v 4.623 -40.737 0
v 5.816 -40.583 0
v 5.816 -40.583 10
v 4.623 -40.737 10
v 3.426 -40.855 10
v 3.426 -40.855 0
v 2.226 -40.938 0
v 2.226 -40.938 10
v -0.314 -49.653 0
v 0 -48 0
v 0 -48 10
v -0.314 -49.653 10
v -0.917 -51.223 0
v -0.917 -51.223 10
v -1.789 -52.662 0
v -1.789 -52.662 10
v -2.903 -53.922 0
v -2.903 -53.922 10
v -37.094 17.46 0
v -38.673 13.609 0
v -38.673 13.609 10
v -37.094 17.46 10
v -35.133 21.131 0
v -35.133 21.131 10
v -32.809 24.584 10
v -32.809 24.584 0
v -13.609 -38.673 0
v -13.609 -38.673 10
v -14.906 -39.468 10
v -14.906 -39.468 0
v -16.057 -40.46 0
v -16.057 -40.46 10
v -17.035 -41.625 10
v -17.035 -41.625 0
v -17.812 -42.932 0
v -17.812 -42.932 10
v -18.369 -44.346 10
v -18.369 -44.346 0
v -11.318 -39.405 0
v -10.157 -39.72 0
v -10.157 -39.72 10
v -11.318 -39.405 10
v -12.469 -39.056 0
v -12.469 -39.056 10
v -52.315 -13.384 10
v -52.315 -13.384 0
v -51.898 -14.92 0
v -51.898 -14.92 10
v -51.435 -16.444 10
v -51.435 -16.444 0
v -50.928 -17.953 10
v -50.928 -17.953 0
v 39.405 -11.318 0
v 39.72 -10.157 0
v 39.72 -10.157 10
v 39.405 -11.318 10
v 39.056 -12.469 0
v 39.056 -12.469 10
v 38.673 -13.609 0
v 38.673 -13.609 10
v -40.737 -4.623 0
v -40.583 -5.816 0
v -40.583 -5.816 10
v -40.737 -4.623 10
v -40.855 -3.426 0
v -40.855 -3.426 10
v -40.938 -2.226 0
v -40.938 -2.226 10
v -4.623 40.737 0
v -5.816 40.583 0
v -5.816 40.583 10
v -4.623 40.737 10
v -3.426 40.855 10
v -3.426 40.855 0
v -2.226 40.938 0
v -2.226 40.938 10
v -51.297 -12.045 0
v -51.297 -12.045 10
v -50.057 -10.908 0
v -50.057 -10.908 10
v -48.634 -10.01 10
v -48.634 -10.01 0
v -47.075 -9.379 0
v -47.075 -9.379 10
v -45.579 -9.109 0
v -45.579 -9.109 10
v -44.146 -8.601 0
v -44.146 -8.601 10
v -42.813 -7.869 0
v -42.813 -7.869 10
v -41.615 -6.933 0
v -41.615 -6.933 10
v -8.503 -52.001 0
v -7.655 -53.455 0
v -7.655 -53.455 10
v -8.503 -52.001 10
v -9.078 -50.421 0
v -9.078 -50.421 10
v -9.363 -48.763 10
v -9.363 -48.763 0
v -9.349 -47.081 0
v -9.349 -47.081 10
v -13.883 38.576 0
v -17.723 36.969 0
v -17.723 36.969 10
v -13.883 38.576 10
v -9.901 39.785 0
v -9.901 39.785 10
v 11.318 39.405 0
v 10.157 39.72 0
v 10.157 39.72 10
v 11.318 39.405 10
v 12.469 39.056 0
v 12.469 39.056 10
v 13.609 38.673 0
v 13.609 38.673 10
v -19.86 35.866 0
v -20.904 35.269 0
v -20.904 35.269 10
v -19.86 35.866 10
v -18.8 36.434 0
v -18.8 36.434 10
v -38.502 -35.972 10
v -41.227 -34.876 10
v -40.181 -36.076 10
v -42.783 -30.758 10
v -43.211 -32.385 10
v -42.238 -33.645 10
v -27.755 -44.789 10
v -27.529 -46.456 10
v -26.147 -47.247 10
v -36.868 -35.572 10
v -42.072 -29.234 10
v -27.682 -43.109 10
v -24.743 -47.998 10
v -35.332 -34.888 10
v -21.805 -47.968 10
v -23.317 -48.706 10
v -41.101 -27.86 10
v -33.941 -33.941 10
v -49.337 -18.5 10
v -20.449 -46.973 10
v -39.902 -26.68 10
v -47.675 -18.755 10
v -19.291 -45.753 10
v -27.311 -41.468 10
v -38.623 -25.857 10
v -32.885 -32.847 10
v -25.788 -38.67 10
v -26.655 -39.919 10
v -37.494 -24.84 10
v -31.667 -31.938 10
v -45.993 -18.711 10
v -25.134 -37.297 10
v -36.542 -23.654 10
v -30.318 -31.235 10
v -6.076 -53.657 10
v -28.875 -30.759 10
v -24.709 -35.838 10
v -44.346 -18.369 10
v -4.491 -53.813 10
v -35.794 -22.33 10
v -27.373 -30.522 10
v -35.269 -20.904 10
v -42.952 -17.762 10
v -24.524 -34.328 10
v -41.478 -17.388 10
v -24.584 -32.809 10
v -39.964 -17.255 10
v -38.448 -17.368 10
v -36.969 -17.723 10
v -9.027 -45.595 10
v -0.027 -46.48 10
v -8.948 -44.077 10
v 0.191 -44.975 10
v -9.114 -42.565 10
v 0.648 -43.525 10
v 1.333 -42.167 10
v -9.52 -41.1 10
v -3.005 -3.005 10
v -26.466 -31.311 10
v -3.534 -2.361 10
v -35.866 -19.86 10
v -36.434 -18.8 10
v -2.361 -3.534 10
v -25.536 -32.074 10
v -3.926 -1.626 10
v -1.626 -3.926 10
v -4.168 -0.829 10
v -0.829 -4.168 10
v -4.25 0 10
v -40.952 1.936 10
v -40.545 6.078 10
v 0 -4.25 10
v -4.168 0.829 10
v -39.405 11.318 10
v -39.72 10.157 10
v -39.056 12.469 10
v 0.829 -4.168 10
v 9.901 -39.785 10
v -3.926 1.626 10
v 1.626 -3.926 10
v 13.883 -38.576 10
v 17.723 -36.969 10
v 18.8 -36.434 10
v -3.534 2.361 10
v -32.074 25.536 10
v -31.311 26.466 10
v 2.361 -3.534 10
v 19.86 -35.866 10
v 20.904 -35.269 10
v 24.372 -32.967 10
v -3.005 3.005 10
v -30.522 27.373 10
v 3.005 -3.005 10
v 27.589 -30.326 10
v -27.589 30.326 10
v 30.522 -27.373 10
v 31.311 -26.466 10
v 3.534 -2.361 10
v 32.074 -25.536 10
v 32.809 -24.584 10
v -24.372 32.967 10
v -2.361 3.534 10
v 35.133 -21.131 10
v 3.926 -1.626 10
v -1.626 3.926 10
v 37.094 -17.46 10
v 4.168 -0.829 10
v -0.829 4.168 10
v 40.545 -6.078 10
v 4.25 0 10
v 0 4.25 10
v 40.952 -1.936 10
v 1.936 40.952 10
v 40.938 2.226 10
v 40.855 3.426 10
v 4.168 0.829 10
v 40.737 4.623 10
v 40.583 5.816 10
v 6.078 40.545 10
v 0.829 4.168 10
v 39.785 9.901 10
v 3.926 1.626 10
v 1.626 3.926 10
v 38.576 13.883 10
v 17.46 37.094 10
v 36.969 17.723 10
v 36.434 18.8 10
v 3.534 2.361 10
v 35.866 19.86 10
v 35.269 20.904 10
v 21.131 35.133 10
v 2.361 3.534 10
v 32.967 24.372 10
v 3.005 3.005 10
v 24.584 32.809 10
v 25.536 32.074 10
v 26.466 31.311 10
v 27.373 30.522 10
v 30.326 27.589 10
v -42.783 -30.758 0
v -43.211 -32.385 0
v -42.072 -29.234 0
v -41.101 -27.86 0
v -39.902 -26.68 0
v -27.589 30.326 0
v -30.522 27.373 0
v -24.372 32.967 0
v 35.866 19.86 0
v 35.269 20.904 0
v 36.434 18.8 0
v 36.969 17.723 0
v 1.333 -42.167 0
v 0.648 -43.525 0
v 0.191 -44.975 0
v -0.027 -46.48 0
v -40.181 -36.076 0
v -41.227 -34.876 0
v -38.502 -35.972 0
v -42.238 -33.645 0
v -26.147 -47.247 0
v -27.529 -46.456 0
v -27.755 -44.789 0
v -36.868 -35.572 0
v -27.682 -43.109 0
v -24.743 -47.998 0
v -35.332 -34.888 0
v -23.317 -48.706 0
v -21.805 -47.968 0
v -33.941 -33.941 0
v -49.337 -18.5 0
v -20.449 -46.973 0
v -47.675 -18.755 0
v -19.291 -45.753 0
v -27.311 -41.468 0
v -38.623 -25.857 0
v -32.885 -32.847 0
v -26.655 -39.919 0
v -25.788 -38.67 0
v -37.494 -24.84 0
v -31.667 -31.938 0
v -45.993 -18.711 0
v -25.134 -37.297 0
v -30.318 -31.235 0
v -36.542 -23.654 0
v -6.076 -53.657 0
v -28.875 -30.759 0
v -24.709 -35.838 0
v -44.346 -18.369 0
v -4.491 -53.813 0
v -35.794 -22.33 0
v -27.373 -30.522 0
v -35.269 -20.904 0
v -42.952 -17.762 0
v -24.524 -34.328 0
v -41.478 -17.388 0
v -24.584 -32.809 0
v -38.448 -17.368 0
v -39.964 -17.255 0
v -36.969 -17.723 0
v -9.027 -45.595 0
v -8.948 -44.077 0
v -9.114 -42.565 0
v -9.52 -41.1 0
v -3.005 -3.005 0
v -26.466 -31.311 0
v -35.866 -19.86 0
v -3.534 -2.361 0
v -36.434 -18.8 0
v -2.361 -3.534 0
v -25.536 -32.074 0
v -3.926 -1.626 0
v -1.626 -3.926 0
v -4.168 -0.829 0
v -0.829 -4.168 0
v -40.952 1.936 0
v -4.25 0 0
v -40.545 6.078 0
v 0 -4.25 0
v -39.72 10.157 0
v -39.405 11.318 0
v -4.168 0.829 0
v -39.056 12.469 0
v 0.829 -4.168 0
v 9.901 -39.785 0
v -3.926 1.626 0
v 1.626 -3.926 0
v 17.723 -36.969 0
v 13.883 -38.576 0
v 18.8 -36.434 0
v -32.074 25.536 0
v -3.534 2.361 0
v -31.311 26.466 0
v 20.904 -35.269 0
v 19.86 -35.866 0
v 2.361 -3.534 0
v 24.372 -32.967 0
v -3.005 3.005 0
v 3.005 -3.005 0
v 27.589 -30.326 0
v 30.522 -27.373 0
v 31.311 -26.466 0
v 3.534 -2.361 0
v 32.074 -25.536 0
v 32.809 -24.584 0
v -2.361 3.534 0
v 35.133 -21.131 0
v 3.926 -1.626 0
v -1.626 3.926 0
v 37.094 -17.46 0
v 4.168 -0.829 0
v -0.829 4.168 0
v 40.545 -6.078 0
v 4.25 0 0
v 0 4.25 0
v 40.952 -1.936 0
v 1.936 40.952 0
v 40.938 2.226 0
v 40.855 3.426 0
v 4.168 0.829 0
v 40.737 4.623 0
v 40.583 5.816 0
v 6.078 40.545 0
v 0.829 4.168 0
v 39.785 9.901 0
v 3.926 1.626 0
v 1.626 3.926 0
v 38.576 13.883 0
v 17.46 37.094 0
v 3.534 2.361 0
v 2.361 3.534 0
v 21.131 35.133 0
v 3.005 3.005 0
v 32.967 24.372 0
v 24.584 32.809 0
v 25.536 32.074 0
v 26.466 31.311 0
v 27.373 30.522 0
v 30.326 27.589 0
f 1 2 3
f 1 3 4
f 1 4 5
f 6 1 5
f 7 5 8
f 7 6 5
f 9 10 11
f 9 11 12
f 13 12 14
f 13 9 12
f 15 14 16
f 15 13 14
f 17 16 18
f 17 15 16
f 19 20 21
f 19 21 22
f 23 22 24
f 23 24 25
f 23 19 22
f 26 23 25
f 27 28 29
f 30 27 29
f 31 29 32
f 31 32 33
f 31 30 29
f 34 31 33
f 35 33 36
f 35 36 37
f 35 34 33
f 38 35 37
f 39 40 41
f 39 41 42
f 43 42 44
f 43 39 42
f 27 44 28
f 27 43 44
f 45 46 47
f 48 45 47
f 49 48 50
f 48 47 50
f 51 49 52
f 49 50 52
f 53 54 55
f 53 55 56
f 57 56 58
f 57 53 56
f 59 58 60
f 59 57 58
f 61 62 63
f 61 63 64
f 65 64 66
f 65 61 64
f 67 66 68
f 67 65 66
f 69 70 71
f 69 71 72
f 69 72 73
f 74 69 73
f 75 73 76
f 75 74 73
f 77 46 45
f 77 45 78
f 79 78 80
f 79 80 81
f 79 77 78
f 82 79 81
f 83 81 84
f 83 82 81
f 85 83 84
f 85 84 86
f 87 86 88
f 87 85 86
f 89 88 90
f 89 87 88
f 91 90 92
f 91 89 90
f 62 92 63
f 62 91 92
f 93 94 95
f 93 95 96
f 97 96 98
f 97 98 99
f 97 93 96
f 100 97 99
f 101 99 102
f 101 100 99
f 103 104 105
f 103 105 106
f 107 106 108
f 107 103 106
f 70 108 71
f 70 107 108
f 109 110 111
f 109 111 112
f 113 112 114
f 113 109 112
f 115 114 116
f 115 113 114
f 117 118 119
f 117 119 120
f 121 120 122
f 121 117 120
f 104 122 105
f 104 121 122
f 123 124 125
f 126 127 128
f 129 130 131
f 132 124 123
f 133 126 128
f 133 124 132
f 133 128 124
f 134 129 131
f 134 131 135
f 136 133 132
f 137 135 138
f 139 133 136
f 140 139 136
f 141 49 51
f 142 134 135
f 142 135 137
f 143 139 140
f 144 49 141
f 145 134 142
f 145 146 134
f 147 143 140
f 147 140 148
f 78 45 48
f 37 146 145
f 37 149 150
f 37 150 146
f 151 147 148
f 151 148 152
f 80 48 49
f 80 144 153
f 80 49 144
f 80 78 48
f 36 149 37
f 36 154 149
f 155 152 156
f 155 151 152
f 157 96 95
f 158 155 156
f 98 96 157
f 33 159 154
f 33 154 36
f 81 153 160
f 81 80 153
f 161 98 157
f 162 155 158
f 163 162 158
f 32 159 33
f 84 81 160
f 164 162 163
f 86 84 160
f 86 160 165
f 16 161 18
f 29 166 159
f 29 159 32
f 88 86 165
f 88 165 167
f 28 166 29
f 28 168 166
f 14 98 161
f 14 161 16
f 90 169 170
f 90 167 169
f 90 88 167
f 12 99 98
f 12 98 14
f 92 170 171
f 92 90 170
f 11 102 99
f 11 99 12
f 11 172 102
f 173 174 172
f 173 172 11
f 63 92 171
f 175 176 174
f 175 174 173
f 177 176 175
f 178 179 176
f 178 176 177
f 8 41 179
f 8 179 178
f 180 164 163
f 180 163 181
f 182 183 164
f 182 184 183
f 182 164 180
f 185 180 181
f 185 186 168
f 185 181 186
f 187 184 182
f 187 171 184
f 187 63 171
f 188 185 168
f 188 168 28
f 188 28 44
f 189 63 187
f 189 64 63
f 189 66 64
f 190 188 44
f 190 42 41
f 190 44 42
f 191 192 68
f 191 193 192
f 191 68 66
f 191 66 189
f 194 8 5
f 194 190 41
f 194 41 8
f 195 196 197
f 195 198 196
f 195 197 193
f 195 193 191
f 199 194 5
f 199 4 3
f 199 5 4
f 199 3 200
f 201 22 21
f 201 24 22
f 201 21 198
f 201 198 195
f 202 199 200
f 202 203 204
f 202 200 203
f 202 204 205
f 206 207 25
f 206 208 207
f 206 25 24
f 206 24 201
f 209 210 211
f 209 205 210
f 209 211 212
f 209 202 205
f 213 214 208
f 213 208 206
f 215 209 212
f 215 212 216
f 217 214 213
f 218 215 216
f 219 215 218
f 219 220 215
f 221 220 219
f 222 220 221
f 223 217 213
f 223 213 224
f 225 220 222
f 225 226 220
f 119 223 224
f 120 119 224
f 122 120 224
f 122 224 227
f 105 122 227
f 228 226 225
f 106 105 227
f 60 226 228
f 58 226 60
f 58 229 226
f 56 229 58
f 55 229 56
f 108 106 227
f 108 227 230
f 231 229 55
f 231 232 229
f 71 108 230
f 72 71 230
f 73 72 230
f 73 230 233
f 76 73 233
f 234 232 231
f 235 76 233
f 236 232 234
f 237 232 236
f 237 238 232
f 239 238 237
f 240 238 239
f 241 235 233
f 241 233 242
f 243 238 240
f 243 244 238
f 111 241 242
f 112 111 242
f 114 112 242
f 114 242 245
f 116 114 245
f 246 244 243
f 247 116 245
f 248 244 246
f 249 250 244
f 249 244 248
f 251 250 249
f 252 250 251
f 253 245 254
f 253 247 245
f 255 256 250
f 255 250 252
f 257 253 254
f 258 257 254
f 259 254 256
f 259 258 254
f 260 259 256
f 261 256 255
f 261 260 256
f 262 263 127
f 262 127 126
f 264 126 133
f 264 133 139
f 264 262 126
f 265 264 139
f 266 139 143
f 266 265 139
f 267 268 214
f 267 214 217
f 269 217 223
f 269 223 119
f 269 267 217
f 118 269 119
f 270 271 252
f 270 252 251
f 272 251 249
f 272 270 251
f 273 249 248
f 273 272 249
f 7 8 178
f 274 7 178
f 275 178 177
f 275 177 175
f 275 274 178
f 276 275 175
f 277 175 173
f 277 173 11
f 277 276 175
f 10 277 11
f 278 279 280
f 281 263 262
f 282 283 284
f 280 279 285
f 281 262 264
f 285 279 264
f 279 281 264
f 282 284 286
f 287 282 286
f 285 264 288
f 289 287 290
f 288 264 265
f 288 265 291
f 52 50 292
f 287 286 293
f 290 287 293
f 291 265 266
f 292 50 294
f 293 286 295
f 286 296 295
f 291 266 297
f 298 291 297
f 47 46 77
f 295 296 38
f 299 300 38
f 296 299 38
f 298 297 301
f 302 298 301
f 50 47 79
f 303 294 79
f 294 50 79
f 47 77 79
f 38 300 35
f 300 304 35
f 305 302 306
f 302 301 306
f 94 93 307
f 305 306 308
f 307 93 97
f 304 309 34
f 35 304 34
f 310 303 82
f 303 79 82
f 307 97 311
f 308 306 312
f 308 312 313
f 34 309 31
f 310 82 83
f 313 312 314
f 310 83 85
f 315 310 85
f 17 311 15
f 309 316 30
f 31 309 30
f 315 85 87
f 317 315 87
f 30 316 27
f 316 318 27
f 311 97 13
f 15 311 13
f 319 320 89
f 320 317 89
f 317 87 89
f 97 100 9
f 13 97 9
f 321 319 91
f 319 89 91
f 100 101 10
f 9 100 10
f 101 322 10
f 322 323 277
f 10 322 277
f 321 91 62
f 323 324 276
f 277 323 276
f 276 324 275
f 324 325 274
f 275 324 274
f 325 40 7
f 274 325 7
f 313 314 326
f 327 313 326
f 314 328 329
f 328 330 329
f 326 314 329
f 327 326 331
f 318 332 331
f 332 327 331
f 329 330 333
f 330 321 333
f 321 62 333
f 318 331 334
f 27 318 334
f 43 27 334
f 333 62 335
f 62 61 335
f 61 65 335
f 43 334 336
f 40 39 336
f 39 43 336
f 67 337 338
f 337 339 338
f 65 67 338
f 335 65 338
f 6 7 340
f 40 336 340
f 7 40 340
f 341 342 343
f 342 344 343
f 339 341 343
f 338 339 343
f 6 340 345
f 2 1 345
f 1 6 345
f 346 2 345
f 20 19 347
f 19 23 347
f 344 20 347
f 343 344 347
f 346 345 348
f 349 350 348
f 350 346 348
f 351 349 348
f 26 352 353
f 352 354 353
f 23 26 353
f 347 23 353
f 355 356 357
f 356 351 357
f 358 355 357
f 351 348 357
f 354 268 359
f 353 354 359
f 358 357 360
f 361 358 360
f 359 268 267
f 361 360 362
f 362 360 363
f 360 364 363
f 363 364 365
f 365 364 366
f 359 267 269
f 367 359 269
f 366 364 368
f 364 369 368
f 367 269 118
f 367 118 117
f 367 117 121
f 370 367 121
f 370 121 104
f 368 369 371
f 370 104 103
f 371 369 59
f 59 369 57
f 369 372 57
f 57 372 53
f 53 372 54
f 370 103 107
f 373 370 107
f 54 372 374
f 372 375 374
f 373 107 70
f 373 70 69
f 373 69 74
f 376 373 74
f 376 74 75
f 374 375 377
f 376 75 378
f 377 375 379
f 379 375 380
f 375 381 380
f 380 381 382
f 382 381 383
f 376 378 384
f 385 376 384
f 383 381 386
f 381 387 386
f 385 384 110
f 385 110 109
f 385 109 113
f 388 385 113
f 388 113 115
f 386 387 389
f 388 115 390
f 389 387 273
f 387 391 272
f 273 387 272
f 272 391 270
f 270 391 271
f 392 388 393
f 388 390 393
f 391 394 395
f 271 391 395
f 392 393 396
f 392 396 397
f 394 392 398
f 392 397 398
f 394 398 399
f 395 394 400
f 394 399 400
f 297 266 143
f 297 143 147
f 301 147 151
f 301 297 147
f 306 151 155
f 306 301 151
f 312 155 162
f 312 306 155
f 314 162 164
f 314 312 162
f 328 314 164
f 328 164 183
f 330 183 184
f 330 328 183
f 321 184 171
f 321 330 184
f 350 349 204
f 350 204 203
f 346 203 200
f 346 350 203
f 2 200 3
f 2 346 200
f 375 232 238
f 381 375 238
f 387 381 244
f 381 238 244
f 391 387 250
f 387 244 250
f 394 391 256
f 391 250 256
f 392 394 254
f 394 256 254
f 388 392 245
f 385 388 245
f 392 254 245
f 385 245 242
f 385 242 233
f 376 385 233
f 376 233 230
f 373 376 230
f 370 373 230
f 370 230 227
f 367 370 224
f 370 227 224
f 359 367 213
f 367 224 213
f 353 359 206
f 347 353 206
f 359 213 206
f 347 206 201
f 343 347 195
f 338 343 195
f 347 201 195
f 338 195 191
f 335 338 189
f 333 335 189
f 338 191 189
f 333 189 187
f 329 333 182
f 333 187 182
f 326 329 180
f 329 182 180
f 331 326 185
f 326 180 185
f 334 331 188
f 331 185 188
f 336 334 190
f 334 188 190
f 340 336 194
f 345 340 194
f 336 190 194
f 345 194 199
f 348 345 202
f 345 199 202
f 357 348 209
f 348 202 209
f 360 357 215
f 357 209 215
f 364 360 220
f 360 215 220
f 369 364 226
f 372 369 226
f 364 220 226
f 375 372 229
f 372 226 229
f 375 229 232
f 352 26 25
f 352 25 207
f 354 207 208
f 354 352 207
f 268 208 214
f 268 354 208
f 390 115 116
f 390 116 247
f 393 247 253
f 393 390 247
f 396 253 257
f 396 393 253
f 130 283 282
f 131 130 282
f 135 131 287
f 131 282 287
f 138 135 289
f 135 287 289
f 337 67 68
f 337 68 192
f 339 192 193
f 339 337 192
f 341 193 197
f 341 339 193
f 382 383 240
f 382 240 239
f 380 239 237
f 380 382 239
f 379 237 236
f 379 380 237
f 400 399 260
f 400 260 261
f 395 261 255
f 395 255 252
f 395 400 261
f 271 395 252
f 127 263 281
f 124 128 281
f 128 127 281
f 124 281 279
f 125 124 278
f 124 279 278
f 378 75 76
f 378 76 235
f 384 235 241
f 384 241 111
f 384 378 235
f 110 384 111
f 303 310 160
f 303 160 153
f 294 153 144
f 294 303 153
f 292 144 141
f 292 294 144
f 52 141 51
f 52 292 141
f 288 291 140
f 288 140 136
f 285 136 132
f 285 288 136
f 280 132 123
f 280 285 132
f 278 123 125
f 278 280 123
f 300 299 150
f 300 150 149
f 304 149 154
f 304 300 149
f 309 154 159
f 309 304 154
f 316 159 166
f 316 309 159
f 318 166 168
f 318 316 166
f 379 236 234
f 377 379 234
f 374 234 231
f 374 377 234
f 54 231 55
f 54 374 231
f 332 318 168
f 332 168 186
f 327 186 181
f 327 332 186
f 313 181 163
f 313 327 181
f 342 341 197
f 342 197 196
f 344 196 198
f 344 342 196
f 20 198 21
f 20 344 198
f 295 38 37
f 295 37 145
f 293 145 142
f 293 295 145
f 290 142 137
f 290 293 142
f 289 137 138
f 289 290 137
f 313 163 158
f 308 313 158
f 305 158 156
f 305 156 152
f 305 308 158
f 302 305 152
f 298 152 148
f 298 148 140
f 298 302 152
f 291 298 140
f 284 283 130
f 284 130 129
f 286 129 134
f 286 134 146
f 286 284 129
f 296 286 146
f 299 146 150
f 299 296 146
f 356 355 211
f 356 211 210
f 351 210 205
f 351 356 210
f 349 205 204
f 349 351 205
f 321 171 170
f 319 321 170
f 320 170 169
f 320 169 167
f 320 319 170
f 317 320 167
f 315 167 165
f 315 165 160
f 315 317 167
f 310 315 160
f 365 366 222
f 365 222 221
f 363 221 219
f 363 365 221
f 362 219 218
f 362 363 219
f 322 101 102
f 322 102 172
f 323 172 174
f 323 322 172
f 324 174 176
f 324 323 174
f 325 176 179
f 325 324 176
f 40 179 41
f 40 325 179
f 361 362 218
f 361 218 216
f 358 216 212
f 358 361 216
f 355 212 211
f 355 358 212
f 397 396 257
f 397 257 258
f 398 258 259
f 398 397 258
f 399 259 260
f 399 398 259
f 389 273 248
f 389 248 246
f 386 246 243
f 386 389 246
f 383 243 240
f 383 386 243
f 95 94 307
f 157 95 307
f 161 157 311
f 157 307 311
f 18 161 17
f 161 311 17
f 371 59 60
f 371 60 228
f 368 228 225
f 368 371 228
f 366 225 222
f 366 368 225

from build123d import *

# Parameters (mm, degrees)
SKETCH1_R           = 54
BOSS_EXTRUDE1_DEPTH = 10
CUT_EXTRUDE1_START  = -10
CUT_EXTRUDE1_DEPTH  = 10
CIRPATTERN1_COUNT   = 16
CUT_EXTRUDE2_START  = -10
CUT_EXTRUDE2_DEPTH  = 10
SKETCH5_R           = 4.25
CUT_EXTRUDE3_DEPTH  = 10


with BuildPart() as part:
    # Sketch1 → Boss-Extrude1 (new body)
    with BuildSketch(Plane.XY):
        Circle(SKETCH1_R)
    extrude(amount=BOSS_EXTRUDE1_DEPTH)

    # Sketch2 → Cut-Extrude1 (cut)
    with BuildSketch(Plane.XY.offset(10).offset(CUT_EXTRUDE1_START)):
        with BuildLine():
            ThreePointArc((-2.226451575, 40.937500136), (-0.390558879, 44.240929479), (0, 48))
            ThreePointArc((0, 48), (0.916562017, 51.223157404), (2.90289612, 53.921917567))
            ThreePointArc((2.90289612, 53.921917567), (-5.3015625, 53.739123877), (-13.383578744, 52.315196836))
            ThreePointArc((-13.383578744, 52.315196836), (-10.908183383, 50.056602718), (-9.379467454, 47.07468099))
            ThreePointArc((-9.379467454, 47.07468099), (-8.261894241, 43.464393254), (-5.815884428, 40.583389365))
            ThreePointArc((-5.815884428, 40.583389365), (-4.025064063, 40.79993705), (-2.226451575, 40.937500136))
        make_face()
    cut_extrude1 = extrude(amount=CUT_EXTRUDE1_DEPTH, mode=Mode.SUBTRACT)

    # CirPattern1: Cut-Extrude1 ×16 about axis
    cirpattern1_axis = Axis((0, 0, 0), (0, 0, 1))
    for i in range(1, CIRPATTERN1_COUNT):
        add(cut_extrude1.rotate(cirpattern1_axis, i * 360 / CIRPATTERN1_COUNT), mode=Mode.SUBTRACT)

    # Sketch4 → Cut-Extrude2 (cut)
    with BuildSketch(Plane.XY.offset(10).offset(CUT_EXTRUDE2_START)):
        with BuildLine():
            ThreePointArc((-31.696062253, 26.003762067), (-19.456690994, 36.087022315), (-4.306352435, 40.771207153))
            Line((-4.306352435, 40.771207153), (-5.672057942, 53.701282654))
            ThreePointArc((-5.672057942, 53.701282654), (-41.865929649, 34.106362085), (-53.739123877, -5.3015625))
            Line((-53.739123877, -5.3015625), (-40.79993705, -4.025064063))
            ThreePointArc((-40.79993705, -4.025064063), (-39.234552099, 11.894785646), (-31.696062253, 26.003762067))
        make_face()
        with BuildLine():
            ThreePointArc((-4.306352435, 40.771207153), (40.771207153, 4.306352435), (4.306352435, -40.771207153))
            Line((4.306352435, -40.771207153), (5.672057942, -53.701282654))
            ThreePointArc((5.672057942, -53.701282654), (53.701282654, 5.672057942), (-5.672057942, 53.701282654))
            Line((-5.672057942, 53.701282654), (-4.306352435, 40.771207153))
        make_face()
    extrude(amount=CUT_EXTRUDE2_DEPTH, mode=Mode.SUBTRACT)

    # Sketch5 → Cut-Extrude3 (cut)
    with BuildSketch(Plane.XY.offset(10)):
        Circle(SKETCH5_R)
    extrude(amount=-CUT_EXTRUDE3_DEPTH, mode=Mode.SUBTRACT)


solid = part.part
